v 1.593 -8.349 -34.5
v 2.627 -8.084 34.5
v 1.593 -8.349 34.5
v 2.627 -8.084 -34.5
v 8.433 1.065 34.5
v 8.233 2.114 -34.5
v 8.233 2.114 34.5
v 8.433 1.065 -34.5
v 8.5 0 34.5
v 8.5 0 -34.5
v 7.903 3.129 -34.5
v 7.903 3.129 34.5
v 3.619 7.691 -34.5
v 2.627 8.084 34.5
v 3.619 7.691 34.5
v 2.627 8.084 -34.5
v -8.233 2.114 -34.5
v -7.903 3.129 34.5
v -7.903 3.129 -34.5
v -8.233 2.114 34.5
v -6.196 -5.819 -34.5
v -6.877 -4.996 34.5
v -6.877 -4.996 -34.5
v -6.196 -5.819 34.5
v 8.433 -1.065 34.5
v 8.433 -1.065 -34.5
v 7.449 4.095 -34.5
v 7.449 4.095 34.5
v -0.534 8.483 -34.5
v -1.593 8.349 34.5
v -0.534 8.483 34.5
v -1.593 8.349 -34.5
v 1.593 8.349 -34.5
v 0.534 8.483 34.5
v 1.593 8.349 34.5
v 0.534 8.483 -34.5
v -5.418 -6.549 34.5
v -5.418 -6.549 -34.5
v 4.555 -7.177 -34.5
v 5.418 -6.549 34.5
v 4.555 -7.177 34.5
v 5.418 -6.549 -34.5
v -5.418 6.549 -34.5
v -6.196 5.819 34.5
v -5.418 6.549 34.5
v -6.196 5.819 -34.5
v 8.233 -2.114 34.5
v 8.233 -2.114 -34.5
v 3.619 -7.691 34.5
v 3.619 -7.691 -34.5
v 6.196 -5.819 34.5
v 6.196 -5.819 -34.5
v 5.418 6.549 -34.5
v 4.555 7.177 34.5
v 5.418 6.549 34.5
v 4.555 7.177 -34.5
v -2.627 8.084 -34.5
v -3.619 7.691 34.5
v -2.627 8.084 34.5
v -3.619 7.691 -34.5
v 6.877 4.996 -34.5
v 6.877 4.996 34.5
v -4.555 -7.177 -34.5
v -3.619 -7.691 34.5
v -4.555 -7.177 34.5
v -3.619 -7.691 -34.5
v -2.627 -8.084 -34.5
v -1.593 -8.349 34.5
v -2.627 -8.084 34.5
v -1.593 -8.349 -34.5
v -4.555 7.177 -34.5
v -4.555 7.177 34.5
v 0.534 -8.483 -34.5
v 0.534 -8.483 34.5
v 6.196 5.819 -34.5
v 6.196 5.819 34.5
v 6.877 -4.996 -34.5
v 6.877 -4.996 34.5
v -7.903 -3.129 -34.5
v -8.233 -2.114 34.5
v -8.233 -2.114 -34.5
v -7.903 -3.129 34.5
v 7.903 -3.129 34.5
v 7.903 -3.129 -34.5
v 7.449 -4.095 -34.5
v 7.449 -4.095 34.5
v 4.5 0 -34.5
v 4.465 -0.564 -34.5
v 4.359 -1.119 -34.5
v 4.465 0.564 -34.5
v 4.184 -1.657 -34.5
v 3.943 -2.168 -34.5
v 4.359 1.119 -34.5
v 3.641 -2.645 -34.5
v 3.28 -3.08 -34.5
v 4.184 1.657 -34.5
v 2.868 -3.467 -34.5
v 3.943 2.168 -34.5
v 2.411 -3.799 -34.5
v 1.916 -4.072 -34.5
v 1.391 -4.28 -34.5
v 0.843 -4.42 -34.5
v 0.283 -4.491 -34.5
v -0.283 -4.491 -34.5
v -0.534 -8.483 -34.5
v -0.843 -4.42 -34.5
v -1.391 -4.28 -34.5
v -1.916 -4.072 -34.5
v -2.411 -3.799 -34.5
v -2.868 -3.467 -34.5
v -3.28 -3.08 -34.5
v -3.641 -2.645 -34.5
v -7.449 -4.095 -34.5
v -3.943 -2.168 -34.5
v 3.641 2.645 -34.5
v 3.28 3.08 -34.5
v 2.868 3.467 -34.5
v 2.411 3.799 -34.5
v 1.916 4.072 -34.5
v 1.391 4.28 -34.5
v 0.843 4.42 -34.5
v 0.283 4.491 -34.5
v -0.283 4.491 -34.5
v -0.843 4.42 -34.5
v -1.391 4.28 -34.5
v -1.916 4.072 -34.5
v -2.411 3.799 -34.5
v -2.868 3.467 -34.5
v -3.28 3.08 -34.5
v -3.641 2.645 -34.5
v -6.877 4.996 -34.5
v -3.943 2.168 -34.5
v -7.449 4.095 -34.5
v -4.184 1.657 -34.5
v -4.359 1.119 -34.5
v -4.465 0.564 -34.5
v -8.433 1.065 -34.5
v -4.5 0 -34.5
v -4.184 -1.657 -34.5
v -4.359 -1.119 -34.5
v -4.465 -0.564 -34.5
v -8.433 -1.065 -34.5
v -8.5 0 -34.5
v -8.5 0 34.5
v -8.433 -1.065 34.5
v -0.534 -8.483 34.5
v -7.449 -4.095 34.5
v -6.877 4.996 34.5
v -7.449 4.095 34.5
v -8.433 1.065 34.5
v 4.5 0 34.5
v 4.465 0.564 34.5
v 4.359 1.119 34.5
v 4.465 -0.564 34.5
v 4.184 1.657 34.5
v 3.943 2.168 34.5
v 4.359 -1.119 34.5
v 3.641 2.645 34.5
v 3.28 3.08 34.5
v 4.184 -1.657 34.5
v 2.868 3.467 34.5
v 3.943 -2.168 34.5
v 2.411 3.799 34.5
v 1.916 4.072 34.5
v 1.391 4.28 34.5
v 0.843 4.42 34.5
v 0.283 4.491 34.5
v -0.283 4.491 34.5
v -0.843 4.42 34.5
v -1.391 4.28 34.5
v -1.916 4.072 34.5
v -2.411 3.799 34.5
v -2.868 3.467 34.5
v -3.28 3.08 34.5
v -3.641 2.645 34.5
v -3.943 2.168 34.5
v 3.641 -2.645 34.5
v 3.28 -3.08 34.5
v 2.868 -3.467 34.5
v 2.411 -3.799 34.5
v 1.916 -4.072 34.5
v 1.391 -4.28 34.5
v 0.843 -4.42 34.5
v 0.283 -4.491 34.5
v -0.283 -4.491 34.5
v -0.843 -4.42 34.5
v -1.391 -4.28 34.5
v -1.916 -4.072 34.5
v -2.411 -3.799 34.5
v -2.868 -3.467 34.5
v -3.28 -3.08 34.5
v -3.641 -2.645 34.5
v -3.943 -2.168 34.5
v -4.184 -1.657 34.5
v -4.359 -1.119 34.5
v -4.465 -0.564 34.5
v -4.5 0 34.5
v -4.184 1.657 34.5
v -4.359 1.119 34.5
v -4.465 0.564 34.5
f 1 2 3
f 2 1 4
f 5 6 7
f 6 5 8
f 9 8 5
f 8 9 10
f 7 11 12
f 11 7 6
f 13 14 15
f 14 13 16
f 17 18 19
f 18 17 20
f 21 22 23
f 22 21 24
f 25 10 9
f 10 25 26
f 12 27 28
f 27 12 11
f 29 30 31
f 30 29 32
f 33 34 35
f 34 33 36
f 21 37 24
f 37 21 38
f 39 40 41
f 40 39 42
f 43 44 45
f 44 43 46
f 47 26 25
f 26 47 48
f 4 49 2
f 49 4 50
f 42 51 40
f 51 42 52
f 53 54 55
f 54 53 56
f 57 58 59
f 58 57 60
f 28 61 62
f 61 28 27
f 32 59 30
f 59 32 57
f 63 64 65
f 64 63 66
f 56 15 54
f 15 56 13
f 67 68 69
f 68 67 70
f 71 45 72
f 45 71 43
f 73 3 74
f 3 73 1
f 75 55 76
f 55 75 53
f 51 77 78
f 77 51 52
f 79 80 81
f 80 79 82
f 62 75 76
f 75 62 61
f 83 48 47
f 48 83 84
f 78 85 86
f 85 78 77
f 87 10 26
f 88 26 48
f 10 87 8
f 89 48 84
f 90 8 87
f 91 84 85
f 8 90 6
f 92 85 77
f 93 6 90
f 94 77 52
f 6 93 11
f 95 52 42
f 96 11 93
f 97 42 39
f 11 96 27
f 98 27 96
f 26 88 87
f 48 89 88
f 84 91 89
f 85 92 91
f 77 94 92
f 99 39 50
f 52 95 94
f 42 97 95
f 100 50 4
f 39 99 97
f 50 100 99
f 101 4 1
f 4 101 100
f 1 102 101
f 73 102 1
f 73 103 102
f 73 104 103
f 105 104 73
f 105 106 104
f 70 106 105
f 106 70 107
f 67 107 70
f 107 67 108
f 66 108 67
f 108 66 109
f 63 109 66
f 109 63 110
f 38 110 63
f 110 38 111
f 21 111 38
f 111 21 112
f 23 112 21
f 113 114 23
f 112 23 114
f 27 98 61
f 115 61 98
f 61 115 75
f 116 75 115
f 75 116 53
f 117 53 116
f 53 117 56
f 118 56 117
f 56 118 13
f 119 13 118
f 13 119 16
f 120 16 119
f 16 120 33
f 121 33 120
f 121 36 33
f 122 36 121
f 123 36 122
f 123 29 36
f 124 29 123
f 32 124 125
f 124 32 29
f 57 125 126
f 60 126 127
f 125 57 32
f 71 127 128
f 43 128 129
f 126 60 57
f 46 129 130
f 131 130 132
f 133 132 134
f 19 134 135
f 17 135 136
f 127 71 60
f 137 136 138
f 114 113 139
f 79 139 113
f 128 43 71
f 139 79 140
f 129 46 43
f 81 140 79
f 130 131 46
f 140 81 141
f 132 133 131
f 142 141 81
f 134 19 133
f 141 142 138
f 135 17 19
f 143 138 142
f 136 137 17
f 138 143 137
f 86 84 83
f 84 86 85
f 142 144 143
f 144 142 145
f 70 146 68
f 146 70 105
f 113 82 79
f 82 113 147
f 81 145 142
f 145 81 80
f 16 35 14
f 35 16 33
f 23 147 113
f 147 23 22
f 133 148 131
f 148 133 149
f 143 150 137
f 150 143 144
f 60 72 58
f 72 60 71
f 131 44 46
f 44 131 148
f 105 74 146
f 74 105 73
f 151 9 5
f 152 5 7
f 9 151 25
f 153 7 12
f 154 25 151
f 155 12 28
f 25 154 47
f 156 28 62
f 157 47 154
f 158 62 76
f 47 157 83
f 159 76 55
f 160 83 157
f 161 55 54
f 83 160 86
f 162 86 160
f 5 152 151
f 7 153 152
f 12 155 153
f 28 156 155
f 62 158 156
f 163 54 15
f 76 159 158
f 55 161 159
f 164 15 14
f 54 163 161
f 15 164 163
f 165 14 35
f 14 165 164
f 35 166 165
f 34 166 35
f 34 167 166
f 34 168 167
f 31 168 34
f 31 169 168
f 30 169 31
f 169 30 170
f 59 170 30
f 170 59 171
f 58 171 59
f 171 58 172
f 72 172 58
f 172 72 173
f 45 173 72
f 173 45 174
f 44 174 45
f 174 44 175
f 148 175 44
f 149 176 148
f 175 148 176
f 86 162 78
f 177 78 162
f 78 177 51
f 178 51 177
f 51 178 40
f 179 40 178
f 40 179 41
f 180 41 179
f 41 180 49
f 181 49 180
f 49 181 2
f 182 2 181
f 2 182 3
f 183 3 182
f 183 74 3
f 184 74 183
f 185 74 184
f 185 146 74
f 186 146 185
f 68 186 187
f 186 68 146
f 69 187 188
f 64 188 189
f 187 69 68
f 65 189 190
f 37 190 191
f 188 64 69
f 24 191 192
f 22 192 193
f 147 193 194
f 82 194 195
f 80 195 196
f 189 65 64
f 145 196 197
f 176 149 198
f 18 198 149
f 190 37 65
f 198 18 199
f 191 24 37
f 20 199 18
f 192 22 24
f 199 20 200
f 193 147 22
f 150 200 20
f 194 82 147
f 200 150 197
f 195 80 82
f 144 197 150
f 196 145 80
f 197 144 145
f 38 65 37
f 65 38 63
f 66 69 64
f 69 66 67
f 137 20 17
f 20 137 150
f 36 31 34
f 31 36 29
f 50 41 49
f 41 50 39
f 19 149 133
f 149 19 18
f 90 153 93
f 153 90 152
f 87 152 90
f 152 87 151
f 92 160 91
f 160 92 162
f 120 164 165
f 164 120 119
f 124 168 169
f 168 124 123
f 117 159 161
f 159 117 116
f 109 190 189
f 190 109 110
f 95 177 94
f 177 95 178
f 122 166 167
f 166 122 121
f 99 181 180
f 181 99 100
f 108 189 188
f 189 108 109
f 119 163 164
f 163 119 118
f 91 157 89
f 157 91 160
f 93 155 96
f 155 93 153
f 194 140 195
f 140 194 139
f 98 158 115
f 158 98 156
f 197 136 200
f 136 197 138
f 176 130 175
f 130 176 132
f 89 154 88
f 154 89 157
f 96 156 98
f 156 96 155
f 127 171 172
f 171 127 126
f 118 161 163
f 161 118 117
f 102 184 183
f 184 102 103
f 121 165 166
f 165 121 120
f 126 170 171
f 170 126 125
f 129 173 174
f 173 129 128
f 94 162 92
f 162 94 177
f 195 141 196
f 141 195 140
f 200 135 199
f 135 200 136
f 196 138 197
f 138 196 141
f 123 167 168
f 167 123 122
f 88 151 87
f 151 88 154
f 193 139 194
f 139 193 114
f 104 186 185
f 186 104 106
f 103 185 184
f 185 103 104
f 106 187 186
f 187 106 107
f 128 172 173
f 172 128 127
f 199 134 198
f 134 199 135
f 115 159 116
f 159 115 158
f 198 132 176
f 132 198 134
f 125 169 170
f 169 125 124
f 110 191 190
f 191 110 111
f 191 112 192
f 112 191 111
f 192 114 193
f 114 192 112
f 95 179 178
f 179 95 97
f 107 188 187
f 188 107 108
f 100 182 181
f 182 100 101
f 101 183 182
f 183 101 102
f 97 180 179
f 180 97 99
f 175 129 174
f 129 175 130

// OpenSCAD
$fn = 50;


difference() {
	union() {
		translate(v = [0, 0, -34.5000000000]) {
			cylinder(h = 69, r = 8.5000000000);
		}
	}
	union() {
		translate(v = [0, 0, -100.0000000000]) {
			cylinder(h = 200, r = 4.5000000000);
		}
	}
}
